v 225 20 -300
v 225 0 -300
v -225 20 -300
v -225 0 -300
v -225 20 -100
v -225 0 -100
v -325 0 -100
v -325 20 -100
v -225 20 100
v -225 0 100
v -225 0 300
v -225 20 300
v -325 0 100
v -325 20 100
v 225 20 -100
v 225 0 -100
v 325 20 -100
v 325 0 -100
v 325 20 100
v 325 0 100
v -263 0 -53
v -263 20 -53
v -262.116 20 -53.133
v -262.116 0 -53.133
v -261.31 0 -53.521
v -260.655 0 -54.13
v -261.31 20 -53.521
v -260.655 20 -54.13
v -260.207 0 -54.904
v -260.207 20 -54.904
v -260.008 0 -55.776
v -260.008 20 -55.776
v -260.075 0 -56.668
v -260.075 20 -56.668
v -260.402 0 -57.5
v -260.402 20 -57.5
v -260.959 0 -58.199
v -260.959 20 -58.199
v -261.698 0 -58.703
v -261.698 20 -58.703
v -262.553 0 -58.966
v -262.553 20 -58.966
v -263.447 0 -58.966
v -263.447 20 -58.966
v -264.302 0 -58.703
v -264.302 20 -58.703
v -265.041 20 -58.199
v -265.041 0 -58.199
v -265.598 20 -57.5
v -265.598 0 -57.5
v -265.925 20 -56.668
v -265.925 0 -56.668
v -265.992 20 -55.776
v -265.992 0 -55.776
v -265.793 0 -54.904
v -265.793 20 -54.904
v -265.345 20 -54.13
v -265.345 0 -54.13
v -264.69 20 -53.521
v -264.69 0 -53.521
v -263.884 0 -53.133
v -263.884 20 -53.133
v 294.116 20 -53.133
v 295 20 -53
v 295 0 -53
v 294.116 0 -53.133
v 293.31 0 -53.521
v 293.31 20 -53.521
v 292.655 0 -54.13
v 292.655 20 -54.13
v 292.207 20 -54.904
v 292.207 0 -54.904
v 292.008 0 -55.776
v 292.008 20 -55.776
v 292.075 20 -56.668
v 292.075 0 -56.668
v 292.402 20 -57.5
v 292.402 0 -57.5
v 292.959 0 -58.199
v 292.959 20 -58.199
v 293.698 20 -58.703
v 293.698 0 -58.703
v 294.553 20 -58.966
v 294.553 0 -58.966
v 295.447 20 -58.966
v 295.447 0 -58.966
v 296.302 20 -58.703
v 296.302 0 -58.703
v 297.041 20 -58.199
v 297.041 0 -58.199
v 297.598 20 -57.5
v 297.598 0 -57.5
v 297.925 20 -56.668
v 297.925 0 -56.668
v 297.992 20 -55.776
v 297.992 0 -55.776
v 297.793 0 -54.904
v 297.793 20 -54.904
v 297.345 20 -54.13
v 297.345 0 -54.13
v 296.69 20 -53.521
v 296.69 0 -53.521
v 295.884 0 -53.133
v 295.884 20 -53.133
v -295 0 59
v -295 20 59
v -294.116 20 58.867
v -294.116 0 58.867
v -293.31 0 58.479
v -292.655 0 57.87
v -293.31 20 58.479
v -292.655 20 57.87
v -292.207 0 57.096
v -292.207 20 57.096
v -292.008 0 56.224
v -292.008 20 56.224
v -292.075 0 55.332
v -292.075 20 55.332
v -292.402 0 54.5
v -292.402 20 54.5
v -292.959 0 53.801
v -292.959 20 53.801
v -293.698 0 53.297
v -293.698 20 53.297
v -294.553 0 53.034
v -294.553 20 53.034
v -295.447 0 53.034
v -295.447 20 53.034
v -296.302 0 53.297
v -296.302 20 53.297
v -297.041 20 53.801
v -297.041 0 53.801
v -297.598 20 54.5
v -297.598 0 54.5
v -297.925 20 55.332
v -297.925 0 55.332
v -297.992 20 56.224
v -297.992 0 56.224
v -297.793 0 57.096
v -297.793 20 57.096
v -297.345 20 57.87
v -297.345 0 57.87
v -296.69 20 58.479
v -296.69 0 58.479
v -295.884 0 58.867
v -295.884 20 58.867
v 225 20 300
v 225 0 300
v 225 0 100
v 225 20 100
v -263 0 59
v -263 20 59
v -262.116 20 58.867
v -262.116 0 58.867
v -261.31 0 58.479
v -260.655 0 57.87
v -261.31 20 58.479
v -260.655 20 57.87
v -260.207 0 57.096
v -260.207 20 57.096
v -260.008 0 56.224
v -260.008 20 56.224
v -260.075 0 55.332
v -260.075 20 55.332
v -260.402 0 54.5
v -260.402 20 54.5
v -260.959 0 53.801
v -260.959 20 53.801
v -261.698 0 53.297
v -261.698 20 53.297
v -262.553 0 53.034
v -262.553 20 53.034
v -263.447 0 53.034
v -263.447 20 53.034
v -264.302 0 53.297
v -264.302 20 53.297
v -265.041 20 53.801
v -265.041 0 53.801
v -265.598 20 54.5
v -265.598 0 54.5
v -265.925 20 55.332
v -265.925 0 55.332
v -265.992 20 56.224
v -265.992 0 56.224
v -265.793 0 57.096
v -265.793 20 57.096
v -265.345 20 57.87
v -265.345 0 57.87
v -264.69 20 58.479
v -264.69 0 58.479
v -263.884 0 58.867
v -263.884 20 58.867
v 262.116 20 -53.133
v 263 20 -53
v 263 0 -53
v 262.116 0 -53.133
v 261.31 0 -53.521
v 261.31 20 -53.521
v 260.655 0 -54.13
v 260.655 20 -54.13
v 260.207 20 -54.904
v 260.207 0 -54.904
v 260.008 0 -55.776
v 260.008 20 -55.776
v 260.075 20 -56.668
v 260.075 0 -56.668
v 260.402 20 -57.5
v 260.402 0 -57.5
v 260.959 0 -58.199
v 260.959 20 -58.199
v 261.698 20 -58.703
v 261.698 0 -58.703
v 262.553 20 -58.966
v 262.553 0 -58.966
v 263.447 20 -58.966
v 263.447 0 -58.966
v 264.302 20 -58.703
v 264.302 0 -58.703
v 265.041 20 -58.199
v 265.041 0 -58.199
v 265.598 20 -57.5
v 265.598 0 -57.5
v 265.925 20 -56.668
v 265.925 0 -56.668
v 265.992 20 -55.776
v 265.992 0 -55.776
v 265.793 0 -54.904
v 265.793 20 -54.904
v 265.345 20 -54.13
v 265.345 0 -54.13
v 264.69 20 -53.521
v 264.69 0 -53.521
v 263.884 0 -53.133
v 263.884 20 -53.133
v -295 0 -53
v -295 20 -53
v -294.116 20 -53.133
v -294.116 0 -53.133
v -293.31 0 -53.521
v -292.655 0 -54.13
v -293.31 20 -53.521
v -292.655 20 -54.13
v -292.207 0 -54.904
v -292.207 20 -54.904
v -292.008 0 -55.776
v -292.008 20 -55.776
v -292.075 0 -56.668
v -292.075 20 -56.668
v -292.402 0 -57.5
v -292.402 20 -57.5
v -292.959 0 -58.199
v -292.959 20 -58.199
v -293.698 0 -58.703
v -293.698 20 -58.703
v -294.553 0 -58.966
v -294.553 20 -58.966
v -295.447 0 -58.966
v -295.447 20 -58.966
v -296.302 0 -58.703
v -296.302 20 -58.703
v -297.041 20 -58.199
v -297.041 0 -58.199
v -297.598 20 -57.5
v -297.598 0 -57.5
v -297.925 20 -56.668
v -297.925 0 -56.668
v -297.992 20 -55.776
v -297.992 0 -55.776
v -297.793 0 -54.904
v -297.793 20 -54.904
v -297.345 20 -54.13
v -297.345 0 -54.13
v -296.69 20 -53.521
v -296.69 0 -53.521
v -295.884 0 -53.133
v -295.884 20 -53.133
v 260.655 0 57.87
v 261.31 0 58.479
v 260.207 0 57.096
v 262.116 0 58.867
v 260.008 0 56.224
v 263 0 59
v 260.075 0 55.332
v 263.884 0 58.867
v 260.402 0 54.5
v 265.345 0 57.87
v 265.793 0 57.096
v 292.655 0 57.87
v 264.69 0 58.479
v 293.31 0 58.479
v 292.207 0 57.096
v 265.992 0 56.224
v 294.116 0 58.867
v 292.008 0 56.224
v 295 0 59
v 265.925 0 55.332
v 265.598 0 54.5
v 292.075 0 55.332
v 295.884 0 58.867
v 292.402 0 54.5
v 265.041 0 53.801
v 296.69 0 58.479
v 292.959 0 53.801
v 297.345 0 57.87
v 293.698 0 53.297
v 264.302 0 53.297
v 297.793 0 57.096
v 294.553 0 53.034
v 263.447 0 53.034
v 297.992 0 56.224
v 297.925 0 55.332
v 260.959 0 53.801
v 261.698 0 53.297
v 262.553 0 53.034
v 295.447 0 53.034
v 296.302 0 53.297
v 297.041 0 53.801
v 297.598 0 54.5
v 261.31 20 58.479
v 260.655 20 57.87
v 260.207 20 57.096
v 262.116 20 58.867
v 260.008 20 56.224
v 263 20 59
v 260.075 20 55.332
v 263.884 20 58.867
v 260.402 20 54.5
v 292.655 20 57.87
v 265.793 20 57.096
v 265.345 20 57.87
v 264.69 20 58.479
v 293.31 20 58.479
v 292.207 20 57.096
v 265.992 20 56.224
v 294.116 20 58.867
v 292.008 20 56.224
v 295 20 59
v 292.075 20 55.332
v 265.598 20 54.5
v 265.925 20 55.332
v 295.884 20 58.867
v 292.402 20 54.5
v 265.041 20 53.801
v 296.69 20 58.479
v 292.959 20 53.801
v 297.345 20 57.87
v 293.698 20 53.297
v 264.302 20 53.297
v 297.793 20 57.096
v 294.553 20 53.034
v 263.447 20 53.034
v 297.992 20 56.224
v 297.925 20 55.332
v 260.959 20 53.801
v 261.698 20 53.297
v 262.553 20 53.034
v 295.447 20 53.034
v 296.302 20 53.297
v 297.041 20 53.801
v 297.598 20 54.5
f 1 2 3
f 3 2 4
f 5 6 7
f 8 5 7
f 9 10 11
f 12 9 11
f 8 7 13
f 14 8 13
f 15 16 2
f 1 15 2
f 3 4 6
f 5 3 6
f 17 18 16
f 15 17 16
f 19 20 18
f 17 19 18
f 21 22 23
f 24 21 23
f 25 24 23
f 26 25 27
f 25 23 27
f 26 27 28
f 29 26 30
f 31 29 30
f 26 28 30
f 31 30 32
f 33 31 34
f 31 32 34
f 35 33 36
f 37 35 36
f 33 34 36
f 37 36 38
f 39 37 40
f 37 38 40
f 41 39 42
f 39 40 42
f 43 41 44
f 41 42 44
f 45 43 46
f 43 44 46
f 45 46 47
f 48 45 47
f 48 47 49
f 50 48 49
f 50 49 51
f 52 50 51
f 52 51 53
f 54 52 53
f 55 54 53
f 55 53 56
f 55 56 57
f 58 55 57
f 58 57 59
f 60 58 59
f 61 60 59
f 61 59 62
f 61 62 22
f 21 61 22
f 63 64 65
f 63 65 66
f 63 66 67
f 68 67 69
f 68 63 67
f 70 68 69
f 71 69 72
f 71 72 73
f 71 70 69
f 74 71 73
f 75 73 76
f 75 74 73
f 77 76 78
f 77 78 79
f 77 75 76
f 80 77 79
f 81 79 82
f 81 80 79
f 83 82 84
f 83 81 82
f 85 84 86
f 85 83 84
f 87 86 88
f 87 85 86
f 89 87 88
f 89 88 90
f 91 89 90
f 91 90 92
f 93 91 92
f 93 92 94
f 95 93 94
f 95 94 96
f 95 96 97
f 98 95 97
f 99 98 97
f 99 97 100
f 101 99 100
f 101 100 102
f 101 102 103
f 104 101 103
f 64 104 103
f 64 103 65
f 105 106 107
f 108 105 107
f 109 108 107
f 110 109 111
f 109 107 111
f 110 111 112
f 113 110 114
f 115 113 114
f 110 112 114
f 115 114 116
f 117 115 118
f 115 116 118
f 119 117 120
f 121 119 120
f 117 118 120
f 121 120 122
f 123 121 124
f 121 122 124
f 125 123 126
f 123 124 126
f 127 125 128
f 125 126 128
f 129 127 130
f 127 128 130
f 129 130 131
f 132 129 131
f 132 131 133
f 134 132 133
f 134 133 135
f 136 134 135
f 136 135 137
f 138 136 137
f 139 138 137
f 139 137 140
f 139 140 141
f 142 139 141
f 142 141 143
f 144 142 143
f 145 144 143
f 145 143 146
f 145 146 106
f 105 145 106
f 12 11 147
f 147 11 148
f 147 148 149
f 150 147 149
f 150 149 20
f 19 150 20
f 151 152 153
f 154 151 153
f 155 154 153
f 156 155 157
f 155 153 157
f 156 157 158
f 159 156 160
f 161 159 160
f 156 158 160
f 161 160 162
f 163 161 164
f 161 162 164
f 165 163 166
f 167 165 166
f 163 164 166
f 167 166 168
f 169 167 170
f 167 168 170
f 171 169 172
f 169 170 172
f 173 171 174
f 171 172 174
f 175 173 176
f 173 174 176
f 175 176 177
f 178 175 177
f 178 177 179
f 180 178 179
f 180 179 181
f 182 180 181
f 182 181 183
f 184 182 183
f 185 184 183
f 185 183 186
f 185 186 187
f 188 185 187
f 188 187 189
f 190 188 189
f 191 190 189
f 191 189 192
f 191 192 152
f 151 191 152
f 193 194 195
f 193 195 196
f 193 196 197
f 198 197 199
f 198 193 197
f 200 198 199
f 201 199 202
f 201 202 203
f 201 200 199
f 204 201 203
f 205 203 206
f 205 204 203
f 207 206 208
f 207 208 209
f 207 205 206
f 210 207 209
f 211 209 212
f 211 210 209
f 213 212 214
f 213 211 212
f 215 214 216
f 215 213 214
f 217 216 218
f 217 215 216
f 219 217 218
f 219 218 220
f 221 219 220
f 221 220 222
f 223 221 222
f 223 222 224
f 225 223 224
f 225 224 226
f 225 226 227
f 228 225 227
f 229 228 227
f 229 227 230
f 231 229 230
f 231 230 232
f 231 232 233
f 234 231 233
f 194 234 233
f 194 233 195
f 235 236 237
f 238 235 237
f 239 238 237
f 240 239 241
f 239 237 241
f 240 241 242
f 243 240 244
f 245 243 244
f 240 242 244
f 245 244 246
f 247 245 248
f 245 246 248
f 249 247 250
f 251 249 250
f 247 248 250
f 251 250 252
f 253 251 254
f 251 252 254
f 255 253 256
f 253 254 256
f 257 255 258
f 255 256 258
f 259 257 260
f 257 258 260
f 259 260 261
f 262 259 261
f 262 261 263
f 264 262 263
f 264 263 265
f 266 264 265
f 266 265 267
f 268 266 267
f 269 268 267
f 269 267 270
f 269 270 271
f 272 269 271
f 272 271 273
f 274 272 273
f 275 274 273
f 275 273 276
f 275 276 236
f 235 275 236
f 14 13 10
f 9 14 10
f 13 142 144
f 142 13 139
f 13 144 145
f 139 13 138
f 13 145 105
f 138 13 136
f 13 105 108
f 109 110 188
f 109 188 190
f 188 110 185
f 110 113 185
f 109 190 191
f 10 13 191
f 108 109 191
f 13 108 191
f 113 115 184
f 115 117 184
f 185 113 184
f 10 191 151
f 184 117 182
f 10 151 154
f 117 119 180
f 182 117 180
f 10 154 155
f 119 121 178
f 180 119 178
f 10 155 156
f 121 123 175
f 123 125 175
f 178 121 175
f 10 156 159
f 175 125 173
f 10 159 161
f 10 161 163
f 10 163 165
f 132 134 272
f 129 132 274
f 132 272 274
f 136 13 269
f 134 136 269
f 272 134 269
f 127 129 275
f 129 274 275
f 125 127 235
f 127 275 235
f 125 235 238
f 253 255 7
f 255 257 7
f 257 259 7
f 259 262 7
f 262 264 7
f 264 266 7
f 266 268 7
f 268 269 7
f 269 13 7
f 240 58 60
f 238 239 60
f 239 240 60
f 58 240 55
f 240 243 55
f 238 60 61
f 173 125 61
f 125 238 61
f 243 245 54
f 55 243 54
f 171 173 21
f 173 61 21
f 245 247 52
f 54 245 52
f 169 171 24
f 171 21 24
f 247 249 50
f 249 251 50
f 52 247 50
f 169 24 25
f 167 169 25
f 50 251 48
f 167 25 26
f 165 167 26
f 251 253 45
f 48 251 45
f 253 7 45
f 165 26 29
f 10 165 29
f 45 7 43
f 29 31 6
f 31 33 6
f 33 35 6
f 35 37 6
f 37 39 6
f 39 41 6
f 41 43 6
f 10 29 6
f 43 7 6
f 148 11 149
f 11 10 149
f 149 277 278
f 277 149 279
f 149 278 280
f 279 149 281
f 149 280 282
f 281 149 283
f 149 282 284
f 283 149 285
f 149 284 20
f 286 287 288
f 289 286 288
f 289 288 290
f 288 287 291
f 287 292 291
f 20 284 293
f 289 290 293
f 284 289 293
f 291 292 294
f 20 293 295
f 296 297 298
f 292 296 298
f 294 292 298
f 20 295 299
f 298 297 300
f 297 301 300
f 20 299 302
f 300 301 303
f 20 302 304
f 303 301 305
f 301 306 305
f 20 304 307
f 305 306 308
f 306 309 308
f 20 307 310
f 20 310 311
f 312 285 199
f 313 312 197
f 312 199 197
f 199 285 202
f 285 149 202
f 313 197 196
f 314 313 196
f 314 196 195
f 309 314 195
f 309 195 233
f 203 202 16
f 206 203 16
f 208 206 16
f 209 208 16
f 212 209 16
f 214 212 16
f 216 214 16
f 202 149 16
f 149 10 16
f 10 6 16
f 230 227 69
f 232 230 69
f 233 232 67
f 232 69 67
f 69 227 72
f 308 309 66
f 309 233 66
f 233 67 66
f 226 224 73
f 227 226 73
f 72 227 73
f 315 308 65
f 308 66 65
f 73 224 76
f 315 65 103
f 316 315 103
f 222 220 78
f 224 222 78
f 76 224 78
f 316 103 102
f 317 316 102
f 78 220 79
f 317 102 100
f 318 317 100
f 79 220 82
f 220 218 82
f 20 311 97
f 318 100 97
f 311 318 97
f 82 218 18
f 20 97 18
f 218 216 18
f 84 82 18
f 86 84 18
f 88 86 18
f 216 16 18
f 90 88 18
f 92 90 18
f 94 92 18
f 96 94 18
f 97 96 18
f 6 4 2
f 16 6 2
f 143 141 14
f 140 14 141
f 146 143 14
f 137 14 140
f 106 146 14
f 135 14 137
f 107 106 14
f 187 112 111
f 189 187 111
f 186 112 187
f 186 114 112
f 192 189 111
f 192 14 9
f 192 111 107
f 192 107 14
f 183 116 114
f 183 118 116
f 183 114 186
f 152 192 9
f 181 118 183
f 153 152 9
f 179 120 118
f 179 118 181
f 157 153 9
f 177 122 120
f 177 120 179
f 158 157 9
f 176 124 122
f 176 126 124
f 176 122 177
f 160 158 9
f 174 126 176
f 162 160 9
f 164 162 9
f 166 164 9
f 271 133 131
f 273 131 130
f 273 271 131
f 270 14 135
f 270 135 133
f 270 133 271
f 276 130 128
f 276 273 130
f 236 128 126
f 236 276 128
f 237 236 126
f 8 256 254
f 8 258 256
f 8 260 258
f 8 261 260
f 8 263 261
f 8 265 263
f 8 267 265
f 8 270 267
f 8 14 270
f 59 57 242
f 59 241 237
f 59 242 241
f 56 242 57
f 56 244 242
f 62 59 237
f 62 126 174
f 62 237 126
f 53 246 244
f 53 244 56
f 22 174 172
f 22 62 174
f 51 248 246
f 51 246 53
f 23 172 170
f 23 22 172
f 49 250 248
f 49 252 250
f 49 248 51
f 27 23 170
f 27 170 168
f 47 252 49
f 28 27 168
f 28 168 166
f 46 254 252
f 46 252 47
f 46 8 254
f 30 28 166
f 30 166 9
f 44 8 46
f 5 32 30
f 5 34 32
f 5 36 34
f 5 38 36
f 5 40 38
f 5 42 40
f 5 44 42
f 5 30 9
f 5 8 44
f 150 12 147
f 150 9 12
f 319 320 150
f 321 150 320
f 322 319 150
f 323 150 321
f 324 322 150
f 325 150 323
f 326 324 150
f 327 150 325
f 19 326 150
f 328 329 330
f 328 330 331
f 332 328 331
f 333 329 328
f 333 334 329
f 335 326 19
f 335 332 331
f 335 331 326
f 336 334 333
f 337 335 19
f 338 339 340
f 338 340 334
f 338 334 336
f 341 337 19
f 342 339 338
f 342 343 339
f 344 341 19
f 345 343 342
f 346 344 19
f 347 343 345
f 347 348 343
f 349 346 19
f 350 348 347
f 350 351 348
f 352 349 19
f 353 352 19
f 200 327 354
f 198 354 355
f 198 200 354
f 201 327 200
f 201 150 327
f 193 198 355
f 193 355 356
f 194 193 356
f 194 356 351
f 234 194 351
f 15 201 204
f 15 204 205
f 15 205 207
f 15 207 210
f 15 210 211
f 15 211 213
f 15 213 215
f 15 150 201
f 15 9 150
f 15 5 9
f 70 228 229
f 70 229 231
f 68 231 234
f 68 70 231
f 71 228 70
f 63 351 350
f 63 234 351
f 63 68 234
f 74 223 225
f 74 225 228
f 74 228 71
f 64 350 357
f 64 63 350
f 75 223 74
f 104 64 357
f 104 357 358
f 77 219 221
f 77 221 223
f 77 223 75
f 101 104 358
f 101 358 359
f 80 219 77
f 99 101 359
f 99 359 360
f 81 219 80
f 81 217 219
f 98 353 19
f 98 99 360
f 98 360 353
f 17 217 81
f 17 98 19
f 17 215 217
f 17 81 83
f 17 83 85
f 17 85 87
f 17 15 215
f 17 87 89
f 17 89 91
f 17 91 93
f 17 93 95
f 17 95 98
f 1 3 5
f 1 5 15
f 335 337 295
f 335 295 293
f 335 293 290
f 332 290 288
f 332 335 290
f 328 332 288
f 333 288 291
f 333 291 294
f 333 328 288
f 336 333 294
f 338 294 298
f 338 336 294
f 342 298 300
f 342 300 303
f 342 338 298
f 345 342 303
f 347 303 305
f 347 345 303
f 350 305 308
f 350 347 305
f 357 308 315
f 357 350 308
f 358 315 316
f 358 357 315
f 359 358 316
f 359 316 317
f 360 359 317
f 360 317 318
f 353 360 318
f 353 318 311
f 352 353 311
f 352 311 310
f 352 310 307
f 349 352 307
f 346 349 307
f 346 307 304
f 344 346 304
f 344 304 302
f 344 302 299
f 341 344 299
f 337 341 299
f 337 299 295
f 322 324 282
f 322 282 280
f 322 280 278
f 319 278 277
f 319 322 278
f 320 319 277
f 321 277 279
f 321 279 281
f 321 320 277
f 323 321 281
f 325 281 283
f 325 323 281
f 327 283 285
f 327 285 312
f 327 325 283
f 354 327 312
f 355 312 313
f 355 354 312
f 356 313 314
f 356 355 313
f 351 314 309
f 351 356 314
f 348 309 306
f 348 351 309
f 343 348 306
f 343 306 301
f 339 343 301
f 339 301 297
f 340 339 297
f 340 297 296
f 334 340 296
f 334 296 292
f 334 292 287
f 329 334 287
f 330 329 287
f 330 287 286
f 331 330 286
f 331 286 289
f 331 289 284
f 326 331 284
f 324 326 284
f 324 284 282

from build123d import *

# Parameters (mm, degrees)
BOSS_EXTRUDE1_DEPTH = 20
CUT_EXTRUDE1_REACH  = 444.747
SKETCH2_R           = 3


with BuildPart() as part:
    # Sketch1 → Boss-Extrude1 (new body)
    with BuildSketch(Plane(origin=(0, 0, 0), x_dir=(1, 0, 0), z_dir=(0, 1, 0))):
        Polygon((-225, -300), (225, -300), (225, -100), (325, -100), (325, 100), (225, 100), (225, 300), (-225, 300), (-225, 100), (-325, 100), (-325, -100), (-225, -100), align=None)
    extrude(amount=BOSS_EXTRUDE1_DEPTH)

    # Sketch2 → Cut-Extrude1 (cut, up to next)
    with BuildSketch(Plane(origin=(0, 20, 0), x_dir=(1, 0, 0), z_dir=(0, 1, 0)), mode=Mode.PRIVATE) as cut_extrude1_sk1:
        with Locations(Location((-295, -56, 0), (0, 0, 270))):
            Circle(SKETCH2_R)
    cut_extrude1_tool1 = extrude(cut_extrude1_sk1.sketch, amount=-CUT_EXTRUDE1_REACH, mode=Mode.PRIVATE) & part.part
    # Sketch2 → Cut-Extrude1 (cut, up to next)
    with BuildSketch(Plane(origin=(0, 20, 0), x_dir=(1, 0, 0), z_dir=(0, 1, 0)), mode=Mode.PRIVATE) as cut_extrude1_sk2:
        with Locations(Location((-263, -56, 0), (0, 0, 270))):
            Circle(SKETCH2_R)
    cut_extrude1_tool2 = extrude(cut_extrude1_sk2.sketch, amount=-CUT_EXTRUDE1_REACH, mode=Mode.PRIVATE) & part.part
    # Sketch2 → Cut-Extrude1 (cut, up to next)
    with BuildSketch(Plane(origin=(0, 20, 0), x_dir=(1, 0, 0), z_dir=(0, 1, 0)), mode=Mode.PRIVATE) as cut_extrude1_sk3:
        with Locations(Location((-263, 56, 0), (0, 0, 270))):
            Circle(SKETCH2_R)
    cut_extrude1_tool3 = extrude(cut_extrude1_sk3.sketch, amount=-CUT_EXTRUDE1_REACH, mode=Mode.PRIVATE) & part.part
    # Sketch2 → Cut-Extrude1 (cut, up to next)
    with BuildSketch(Plane(origin=(0, 20, 0), x_dir=(1, 0, 0), z_dir=(0, 1, 0)), mode=Mode.PRIVATE) as cut_extrude1_sk4:
        with Locations(Location((-295, 56, 0), (0, 0, 270))):
            Circle(SKETCH2_R)
    cut_extrude1_tool4 = extrude(cut_extrude1_sk4.sketch, amount=-CUT_EXTRUDE1_REACH, mode=Mode.PRIVATE) & part.part
    cut_extrude1_1 = cut_extrude1_tool1.solids().sort_by_distance((-295, 20, 56))[0]
    add(cut_extrude1_1, mode=Mode.SUBTRACT)
    cut_extrude1_2 = cut_extrude1_tool2.solids().sort_by_distance((-263, 20, 56))[0]
    add(cut_extrude1_2, mode=Mode.SUBTRACT)
    cut_extrude1_3 = cut_extrude1_tool3.solids().sort_by_distance((-263, 20, -56))[0]
    add(cut_extrude1_3, mode=Mode.SUBTRACT)
    cut_extrude1_4 = cut_extrude1_tool4.solids().sort_by_distance((-295, 20, -56))[0]
    add(cut_extrude1_4, mode=Mode.SUBTRACT)
    cut_extrude1 = cut_extrude1_1 + cut_extrude1_2 + cut_extrude1_3 + cut_extrude1_4  # Cut-Extrude1 as one shape, for the pattern or mirror that repeats it

    # Mirror1: Cut-Extrude1 across plane
    add(cut_extrude1.mirror(Plane(origin=(0, 0, 0), x_dir=(0, 0, 1), z_dir=(1, 0, 0))), mode=Mode.SUBTRACT)


solid = part.part
